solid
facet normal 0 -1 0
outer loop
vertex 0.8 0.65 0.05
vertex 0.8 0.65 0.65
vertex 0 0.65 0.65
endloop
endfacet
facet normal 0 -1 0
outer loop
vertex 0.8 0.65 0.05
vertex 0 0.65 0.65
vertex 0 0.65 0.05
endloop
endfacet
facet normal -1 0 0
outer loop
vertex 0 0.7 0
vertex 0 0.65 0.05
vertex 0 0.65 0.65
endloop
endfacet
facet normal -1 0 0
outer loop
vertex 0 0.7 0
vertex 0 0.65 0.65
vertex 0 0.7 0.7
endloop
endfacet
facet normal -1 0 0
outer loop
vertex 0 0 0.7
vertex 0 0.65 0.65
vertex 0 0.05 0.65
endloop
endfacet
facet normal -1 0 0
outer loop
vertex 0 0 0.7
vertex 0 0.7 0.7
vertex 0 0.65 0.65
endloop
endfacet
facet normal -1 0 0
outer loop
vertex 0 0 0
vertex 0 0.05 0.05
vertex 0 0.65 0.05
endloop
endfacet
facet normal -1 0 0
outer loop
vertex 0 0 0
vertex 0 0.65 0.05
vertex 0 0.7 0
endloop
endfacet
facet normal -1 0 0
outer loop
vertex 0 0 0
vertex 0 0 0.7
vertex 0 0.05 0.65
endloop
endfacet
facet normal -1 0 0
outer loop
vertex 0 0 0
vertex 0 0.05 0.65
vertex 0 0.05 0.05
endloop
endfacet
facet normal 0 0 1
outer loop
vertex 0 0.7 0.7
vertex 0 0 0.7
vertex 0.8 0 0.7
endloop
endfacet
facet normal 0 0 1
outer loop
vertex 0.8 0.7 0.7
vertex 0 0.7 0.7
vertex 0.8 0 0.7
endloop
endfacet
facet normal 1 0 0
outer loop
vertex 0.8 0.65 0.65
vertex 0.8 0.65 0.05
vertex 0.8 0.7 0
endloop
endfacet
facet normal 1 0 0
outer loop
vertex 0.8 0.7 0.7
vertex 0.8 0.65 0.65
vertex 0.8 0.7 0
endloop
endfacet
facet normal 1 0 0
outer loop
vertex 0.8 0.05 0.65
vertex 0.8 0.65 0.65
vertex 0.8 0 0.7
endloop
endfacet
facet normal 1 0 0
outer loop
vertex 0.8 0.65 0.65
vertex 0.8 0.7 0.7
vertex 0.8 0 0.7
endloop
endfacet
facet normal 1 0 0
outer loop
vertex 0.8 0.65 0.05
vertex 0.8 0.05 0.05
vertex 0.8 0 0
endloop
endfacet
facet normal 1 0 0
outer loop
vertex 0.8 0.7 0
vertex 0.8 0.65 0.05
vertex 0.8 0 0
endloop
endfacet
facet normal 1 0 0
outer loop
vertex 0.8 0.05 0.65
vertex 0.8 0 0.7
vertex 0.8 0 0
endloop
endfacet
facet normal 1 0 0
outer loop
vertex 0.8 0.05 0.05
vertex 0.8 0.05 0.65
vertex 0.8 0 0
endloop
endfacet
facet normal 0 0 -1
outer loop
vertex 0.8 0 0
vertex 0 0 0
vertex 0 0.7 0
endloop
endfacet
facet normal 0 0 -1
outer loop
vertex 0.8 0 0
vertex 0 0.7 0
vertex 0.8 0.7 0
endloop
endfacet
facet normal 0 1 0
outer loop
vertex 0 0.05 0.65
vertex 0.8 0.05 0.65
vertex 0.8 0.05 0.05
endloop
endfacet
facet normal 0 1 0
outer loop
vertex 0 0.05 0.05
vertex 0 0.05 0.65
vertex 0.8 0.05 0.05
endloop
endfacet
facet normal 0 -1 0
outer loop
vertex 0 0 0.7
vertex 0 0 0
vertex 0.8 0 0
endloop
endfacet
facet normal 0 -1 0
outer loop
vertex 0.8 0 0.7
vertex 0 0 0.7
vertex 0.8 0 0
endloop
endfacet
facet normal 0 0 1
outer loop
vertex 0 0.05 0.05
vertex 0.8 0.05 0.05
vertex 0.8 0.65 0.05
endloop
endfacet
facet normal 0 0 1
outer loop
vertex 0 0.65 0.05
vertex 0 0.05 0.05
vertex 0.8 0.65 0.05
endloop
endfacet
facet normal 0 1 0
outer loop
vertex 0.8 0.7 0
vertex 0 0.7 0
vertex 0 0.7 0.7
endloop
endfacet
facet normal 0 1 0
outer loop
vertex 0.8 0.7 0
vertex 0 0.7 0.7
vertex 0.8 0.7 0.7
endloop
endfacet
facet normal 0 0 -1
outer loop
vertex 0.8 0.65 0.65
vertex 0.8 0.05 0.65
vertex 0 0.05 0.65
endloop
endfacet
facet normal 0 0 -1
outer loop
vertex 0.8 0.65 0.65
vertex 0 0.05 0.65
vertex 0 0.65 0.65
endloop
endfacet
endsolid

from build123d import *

# Parameters (mm, degrees)
SKETCH1_W               = 0.8
SKETCH1_H               = 0.7
BOSS_EXTRUDE1_DEPTH     = 0.7
SKETCH2_W               = 0.6
SKETCH2_H               = 0.6
CUT_EXTRUDE1_DEPTH      = 1
CUT_EXTRUDE1_DEPTH_BACK = 1.8


with BuildPart() as part:
    # Sketch1 → Boss-Extrude1 (new body)
    with BuildSketch(Plane(origin=(0, 0, 0), x_dir=(1, 0, 0), z_dir=(0, 1, 0))):
        with Locations((0.4, -0.35)):
            Rectangle(SKETCH1_W, SKETCH1_H)
    extrude(amount=BOSS_EXTRUDE1_DEPTH)

    # Sketch2 → Cut-Extrude1 (cut, two sides)
    with BuildSketch(Plane(origin=(0.8, 0, 0), x_dir=(0, 0, -1), z_dir=(1, 0, 0))) as cut_extrude1_sk:
        with Locations((-0.35, 0.35)):
            Rectangle(SKETCH2_W, SKETCH2_H)
    extrude(amount=CUT_EXTRUDE1_DEPTH, mode=Mode.SUBTRACT)
    extrude(cut_extrude1_sk.sketch, amount=-CUT_EXTRUDE1_DEPTH_BACK, mode=Mode.SUBTRACT)


solid = part.part
